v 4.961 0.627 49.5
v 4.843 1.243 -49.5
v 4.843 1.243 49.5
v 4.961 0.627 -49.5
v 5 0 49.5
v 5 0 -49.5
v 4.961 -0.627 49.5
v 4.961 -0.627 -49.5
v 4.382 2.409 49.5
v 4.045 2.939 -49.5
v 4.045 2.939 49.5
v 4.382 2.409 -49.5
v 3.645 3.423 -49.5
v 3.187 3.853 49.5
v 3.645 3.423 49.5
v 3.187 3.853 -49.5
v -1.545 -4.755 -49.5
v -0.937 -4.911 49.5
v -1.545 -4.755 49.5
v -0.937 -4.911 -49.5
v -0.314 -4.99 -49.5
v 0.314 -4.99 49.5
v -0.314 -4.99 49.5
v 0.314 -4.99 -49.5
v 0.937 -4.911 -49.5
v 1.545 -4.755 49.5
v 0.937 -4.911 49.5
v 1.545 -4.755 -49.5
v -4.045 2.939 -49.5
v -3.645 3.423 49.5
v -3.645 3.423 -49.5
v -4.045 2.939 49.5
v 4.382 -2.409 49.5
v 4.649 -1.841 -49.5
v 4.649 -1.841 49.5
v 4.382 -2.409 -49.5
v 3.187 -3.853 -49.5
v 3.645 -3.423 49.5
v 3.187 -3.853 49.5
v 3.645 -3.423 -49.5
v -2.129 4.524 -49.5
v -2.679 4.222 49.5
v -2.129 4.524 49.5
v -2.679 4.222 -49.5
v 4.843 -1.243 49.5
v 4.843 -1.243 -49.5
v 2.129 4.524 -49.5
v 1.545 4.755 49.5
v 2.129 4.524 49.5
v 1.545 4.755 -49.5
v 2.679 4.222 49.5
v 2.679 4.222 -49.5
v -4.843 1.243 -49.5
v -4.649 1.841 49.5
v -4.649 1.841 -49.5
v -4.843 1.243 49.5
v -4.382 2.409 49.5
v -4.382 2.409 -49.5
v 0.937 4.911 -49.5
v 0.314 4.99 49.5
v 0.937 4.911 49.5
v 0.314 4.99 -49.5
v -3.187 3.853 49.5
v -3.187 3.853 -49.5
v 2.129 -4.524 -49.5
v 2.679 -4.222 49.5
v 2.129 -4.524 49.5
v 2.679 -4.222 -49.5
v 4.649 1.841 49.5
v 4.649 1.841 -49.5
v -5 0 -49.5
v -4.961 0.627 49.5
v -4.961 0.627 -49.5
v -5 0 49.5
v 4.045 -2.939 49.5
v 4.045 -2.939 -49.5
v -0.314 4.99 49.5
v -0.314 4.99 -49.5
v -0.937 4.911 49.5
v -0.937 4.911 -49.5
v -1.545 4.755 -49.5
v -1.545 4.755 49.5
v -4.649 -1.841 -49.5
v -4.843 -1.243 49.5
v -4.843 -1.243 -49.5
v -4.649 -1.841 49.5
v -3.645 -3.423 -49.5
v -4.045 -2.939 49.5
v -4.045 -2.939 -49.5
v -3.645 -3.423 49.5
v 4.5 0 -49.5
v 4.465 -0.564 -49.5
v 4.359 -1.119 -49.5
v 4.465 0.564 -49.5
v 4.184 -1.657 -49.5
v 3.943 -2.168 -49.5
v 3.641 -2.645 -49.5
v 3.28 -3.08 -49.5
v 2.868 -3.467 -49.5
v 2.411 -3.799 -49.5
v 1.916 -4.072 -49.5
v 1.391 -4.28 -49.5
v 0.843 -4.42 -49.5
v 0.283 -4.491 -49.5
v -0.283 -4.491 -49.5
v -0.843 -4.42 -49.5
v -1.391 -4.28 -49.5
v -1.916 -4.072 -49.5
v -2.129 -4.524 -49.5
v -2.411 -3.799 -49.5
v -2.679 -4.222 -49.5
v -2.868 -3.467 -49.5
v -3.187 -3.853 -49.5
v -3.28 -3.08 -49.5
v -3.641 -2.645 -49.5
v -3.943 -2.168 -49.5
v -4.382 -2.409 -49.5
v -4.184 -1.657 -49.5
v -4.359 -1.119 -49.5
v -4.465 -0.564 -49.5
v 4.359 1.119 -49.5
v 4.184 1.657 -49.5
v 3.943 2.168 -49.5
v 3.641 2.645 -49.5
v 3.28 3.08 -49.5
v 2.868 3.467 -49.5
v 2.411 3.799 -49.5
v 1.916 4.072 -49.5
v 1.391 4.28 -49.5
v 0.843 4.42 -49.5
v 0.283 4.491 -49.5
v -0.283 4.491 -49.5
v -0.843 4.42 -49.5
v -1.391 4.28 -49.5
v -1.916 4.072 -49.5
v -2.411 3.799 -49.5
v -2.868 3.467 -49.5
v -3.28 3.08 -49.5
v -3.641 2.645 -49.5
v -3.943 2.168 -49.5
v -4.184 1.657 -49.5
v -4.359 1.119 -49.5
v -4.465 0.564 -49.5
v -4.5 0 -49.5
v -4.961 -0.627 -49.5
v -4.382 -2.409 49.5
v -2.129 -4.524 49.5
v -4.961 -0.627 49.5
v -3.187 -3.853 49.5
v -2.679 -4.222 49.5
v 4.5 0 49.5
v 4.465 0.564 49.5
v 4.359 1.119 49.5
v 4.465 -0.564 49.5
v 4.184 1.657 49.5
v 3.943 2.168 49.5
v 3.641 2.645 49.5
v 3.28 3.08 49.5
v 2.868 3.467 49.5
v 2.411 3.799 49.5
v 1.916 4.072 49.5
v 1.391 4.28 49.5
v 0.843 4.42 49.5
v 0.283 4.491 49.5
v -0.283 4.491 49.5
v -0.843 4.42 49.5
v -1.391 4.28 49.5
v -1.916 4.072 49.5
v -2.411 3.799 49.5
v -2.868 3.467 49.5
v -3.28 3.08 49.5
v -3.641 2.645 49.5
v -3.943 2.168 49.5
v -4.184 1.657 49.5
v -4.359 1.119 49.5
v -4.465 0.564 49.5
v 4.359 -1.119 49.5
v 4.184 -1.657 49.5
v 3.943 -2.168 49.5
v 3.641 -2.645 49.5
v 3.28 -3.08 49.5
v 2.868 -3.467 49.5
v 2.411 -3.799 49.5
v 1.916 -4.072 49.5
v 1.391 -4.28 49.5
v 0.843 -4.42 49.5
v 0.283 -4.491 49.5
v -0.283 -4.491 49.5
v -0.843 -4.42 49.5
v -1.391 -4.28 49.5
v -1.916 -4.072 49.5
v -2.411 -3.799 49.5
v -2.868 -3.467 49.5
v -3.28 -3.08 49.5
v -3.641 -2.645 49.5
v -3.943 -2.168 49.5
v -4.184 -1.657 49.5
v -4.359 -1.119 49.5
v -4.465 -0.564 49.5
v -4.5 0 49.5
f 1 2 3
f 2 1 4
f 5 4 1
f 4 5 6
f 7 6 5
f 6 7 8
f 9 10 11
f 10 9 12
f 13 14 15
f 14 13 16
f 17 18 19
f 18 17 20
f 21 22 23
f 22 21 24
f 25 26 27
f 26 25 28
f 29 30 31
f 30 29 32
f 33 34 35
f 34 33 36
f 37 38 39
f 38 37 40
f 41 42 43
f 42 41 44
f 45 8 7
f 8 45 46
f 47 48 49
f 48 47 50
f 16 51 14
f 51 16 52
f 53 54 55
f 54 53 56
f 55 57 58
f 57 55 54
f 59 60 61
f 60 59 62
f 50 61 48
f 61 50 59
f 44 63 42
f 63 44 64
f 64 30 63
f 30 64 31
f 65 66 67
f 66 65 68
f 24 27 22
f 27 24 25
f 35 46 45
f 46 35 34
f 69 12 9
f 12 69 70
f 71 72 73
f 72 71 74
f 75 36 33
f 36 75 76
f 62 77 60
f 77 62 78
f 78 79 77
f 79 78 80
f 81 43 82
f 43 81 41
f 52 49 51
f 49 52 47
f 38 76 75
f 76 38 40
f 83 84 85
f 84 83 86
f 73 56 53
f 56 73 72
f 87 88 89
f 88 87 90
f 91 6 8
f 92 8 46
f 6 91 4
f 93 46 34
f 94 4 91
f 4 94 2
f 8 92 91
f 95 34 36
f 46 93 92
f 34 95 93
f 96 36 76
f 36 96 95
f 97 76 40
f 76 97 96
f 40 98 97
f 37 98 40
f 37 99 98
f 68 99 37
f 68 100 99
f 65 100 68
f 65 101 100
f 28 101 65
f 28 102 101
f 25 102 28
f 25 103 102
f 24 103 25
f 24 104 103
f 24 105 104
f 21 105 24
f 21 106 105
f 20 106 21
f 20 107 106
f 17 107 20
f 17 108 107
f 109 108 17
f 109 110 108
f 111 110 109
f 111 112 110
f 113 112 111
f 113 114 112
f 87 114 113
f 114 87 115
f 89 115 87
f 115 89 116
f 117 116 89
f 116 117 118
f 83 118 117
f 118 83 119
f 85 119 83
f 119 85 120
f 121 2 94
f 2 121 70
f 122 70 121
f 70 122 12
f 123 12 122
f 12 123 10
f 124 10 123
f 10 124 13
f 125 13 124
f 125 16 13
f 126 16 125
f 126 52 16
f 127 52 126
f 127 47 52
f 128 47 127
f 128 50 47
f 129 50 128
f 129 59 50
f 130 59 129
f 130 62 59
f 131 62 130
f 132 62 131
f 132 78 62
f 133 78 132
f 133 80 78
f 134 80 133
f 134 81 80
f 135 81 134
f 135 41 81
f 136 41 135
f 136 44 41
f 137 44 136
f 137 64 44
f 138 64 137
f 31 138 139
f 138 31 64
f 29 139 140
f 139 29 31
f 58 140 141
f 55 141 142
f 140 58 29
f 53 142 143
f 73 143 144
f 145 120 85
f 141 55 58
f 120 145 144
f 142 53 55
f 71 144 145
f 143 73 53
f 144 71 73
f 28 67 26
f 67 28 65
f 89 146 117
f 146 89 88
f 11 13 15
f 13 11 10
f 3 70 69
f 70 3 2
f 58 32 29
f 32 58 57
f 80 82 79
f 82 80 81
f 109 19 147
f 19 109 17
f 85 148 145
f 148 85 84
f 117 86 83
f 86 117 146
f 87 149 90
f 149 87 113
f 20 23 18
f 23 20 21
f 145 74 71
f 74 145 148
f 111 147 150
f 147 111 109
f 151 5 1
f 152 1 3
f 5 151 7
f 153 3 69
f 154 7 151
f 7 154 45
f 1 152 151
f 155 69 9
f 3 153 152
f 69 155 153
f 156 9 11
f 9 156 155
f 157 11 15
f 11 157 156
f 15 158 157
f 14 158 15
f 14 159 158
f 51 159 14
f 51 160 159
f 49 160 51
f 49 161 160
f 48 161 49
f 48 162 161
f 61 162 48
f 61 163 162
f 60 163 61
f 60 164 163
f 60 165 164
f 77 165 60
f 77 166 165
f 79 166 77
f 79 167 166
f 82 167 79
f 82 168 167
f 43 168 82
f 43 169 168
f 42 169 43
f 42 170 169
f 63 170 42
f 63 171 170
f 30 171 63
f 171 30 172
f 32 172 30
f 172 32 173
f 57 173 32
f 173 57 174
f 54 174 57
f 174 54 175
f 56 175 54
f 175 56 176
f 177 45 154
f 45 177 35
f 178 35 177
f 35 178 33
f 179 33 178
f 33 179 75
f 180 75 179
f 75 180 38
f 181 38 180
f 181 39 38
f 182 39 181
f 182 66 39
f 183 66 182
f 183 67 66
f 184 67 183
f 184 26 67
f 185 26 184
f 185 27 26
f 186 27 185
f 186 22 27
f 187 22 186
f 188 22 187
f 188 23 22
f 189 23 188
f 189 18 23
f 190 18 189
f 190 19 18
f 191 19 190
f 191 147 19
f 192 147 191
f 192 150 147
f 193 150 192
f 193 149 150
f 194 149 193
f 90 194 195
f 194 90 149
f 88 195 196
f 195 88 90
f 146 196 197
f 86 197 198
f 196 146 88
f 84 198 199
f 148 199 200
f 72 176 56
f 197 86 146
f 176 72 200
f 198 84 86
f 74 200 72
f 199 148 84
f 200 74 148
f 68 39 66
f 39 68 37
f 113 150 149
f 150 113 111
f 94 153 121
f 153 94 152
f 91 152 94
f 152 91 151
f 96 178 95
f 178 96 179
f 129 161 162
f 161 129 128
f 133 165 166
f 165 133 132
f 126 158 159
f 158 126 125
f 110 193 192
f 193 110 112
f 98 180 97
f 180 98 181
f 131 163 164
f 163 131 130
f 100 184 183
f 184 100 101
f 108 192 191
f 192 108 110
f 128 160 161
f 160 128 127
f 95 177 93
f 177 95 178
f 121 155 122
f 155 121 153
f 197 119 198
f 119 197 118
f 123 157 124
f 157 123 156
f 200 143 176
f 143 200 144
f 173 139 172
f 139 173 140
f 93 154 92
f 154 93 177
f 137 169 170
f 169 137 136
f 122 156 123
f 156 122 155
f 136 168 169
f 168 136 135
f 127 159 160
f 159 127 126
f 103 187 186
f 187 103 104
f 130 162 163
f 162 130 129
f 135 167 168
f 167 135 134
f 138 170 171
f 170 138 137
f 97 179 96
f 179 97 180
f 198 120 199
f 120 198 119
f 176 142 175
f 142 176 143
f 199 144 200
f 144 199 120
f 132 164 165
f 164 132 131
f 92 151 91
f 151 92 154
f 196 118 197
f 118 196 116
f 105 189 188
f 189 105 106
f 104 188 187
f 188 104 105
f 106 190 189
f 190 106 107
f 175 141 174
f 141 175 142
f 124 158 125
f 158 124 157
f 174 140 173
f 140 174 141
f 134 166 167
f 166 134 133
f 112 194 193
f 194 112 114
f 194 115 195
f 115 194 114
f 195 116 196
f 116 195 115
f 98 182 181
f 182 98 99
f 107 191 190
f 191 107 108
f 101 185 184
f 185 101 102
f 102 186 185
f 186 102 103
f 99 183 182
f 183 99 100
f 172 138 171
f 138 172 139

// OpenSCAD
$fn = 50;


difference() {
	union() {
		translate(v = [0, 0, -49.5000000000]) {
			cylinder(h = 99, r = 5.0000000000);
		}
	}
	union() {
		translate(v = [0, 0, -100.0000000000]) {
			cylinder(h = 200, r = 4.5000000000);
		}
	}
}
